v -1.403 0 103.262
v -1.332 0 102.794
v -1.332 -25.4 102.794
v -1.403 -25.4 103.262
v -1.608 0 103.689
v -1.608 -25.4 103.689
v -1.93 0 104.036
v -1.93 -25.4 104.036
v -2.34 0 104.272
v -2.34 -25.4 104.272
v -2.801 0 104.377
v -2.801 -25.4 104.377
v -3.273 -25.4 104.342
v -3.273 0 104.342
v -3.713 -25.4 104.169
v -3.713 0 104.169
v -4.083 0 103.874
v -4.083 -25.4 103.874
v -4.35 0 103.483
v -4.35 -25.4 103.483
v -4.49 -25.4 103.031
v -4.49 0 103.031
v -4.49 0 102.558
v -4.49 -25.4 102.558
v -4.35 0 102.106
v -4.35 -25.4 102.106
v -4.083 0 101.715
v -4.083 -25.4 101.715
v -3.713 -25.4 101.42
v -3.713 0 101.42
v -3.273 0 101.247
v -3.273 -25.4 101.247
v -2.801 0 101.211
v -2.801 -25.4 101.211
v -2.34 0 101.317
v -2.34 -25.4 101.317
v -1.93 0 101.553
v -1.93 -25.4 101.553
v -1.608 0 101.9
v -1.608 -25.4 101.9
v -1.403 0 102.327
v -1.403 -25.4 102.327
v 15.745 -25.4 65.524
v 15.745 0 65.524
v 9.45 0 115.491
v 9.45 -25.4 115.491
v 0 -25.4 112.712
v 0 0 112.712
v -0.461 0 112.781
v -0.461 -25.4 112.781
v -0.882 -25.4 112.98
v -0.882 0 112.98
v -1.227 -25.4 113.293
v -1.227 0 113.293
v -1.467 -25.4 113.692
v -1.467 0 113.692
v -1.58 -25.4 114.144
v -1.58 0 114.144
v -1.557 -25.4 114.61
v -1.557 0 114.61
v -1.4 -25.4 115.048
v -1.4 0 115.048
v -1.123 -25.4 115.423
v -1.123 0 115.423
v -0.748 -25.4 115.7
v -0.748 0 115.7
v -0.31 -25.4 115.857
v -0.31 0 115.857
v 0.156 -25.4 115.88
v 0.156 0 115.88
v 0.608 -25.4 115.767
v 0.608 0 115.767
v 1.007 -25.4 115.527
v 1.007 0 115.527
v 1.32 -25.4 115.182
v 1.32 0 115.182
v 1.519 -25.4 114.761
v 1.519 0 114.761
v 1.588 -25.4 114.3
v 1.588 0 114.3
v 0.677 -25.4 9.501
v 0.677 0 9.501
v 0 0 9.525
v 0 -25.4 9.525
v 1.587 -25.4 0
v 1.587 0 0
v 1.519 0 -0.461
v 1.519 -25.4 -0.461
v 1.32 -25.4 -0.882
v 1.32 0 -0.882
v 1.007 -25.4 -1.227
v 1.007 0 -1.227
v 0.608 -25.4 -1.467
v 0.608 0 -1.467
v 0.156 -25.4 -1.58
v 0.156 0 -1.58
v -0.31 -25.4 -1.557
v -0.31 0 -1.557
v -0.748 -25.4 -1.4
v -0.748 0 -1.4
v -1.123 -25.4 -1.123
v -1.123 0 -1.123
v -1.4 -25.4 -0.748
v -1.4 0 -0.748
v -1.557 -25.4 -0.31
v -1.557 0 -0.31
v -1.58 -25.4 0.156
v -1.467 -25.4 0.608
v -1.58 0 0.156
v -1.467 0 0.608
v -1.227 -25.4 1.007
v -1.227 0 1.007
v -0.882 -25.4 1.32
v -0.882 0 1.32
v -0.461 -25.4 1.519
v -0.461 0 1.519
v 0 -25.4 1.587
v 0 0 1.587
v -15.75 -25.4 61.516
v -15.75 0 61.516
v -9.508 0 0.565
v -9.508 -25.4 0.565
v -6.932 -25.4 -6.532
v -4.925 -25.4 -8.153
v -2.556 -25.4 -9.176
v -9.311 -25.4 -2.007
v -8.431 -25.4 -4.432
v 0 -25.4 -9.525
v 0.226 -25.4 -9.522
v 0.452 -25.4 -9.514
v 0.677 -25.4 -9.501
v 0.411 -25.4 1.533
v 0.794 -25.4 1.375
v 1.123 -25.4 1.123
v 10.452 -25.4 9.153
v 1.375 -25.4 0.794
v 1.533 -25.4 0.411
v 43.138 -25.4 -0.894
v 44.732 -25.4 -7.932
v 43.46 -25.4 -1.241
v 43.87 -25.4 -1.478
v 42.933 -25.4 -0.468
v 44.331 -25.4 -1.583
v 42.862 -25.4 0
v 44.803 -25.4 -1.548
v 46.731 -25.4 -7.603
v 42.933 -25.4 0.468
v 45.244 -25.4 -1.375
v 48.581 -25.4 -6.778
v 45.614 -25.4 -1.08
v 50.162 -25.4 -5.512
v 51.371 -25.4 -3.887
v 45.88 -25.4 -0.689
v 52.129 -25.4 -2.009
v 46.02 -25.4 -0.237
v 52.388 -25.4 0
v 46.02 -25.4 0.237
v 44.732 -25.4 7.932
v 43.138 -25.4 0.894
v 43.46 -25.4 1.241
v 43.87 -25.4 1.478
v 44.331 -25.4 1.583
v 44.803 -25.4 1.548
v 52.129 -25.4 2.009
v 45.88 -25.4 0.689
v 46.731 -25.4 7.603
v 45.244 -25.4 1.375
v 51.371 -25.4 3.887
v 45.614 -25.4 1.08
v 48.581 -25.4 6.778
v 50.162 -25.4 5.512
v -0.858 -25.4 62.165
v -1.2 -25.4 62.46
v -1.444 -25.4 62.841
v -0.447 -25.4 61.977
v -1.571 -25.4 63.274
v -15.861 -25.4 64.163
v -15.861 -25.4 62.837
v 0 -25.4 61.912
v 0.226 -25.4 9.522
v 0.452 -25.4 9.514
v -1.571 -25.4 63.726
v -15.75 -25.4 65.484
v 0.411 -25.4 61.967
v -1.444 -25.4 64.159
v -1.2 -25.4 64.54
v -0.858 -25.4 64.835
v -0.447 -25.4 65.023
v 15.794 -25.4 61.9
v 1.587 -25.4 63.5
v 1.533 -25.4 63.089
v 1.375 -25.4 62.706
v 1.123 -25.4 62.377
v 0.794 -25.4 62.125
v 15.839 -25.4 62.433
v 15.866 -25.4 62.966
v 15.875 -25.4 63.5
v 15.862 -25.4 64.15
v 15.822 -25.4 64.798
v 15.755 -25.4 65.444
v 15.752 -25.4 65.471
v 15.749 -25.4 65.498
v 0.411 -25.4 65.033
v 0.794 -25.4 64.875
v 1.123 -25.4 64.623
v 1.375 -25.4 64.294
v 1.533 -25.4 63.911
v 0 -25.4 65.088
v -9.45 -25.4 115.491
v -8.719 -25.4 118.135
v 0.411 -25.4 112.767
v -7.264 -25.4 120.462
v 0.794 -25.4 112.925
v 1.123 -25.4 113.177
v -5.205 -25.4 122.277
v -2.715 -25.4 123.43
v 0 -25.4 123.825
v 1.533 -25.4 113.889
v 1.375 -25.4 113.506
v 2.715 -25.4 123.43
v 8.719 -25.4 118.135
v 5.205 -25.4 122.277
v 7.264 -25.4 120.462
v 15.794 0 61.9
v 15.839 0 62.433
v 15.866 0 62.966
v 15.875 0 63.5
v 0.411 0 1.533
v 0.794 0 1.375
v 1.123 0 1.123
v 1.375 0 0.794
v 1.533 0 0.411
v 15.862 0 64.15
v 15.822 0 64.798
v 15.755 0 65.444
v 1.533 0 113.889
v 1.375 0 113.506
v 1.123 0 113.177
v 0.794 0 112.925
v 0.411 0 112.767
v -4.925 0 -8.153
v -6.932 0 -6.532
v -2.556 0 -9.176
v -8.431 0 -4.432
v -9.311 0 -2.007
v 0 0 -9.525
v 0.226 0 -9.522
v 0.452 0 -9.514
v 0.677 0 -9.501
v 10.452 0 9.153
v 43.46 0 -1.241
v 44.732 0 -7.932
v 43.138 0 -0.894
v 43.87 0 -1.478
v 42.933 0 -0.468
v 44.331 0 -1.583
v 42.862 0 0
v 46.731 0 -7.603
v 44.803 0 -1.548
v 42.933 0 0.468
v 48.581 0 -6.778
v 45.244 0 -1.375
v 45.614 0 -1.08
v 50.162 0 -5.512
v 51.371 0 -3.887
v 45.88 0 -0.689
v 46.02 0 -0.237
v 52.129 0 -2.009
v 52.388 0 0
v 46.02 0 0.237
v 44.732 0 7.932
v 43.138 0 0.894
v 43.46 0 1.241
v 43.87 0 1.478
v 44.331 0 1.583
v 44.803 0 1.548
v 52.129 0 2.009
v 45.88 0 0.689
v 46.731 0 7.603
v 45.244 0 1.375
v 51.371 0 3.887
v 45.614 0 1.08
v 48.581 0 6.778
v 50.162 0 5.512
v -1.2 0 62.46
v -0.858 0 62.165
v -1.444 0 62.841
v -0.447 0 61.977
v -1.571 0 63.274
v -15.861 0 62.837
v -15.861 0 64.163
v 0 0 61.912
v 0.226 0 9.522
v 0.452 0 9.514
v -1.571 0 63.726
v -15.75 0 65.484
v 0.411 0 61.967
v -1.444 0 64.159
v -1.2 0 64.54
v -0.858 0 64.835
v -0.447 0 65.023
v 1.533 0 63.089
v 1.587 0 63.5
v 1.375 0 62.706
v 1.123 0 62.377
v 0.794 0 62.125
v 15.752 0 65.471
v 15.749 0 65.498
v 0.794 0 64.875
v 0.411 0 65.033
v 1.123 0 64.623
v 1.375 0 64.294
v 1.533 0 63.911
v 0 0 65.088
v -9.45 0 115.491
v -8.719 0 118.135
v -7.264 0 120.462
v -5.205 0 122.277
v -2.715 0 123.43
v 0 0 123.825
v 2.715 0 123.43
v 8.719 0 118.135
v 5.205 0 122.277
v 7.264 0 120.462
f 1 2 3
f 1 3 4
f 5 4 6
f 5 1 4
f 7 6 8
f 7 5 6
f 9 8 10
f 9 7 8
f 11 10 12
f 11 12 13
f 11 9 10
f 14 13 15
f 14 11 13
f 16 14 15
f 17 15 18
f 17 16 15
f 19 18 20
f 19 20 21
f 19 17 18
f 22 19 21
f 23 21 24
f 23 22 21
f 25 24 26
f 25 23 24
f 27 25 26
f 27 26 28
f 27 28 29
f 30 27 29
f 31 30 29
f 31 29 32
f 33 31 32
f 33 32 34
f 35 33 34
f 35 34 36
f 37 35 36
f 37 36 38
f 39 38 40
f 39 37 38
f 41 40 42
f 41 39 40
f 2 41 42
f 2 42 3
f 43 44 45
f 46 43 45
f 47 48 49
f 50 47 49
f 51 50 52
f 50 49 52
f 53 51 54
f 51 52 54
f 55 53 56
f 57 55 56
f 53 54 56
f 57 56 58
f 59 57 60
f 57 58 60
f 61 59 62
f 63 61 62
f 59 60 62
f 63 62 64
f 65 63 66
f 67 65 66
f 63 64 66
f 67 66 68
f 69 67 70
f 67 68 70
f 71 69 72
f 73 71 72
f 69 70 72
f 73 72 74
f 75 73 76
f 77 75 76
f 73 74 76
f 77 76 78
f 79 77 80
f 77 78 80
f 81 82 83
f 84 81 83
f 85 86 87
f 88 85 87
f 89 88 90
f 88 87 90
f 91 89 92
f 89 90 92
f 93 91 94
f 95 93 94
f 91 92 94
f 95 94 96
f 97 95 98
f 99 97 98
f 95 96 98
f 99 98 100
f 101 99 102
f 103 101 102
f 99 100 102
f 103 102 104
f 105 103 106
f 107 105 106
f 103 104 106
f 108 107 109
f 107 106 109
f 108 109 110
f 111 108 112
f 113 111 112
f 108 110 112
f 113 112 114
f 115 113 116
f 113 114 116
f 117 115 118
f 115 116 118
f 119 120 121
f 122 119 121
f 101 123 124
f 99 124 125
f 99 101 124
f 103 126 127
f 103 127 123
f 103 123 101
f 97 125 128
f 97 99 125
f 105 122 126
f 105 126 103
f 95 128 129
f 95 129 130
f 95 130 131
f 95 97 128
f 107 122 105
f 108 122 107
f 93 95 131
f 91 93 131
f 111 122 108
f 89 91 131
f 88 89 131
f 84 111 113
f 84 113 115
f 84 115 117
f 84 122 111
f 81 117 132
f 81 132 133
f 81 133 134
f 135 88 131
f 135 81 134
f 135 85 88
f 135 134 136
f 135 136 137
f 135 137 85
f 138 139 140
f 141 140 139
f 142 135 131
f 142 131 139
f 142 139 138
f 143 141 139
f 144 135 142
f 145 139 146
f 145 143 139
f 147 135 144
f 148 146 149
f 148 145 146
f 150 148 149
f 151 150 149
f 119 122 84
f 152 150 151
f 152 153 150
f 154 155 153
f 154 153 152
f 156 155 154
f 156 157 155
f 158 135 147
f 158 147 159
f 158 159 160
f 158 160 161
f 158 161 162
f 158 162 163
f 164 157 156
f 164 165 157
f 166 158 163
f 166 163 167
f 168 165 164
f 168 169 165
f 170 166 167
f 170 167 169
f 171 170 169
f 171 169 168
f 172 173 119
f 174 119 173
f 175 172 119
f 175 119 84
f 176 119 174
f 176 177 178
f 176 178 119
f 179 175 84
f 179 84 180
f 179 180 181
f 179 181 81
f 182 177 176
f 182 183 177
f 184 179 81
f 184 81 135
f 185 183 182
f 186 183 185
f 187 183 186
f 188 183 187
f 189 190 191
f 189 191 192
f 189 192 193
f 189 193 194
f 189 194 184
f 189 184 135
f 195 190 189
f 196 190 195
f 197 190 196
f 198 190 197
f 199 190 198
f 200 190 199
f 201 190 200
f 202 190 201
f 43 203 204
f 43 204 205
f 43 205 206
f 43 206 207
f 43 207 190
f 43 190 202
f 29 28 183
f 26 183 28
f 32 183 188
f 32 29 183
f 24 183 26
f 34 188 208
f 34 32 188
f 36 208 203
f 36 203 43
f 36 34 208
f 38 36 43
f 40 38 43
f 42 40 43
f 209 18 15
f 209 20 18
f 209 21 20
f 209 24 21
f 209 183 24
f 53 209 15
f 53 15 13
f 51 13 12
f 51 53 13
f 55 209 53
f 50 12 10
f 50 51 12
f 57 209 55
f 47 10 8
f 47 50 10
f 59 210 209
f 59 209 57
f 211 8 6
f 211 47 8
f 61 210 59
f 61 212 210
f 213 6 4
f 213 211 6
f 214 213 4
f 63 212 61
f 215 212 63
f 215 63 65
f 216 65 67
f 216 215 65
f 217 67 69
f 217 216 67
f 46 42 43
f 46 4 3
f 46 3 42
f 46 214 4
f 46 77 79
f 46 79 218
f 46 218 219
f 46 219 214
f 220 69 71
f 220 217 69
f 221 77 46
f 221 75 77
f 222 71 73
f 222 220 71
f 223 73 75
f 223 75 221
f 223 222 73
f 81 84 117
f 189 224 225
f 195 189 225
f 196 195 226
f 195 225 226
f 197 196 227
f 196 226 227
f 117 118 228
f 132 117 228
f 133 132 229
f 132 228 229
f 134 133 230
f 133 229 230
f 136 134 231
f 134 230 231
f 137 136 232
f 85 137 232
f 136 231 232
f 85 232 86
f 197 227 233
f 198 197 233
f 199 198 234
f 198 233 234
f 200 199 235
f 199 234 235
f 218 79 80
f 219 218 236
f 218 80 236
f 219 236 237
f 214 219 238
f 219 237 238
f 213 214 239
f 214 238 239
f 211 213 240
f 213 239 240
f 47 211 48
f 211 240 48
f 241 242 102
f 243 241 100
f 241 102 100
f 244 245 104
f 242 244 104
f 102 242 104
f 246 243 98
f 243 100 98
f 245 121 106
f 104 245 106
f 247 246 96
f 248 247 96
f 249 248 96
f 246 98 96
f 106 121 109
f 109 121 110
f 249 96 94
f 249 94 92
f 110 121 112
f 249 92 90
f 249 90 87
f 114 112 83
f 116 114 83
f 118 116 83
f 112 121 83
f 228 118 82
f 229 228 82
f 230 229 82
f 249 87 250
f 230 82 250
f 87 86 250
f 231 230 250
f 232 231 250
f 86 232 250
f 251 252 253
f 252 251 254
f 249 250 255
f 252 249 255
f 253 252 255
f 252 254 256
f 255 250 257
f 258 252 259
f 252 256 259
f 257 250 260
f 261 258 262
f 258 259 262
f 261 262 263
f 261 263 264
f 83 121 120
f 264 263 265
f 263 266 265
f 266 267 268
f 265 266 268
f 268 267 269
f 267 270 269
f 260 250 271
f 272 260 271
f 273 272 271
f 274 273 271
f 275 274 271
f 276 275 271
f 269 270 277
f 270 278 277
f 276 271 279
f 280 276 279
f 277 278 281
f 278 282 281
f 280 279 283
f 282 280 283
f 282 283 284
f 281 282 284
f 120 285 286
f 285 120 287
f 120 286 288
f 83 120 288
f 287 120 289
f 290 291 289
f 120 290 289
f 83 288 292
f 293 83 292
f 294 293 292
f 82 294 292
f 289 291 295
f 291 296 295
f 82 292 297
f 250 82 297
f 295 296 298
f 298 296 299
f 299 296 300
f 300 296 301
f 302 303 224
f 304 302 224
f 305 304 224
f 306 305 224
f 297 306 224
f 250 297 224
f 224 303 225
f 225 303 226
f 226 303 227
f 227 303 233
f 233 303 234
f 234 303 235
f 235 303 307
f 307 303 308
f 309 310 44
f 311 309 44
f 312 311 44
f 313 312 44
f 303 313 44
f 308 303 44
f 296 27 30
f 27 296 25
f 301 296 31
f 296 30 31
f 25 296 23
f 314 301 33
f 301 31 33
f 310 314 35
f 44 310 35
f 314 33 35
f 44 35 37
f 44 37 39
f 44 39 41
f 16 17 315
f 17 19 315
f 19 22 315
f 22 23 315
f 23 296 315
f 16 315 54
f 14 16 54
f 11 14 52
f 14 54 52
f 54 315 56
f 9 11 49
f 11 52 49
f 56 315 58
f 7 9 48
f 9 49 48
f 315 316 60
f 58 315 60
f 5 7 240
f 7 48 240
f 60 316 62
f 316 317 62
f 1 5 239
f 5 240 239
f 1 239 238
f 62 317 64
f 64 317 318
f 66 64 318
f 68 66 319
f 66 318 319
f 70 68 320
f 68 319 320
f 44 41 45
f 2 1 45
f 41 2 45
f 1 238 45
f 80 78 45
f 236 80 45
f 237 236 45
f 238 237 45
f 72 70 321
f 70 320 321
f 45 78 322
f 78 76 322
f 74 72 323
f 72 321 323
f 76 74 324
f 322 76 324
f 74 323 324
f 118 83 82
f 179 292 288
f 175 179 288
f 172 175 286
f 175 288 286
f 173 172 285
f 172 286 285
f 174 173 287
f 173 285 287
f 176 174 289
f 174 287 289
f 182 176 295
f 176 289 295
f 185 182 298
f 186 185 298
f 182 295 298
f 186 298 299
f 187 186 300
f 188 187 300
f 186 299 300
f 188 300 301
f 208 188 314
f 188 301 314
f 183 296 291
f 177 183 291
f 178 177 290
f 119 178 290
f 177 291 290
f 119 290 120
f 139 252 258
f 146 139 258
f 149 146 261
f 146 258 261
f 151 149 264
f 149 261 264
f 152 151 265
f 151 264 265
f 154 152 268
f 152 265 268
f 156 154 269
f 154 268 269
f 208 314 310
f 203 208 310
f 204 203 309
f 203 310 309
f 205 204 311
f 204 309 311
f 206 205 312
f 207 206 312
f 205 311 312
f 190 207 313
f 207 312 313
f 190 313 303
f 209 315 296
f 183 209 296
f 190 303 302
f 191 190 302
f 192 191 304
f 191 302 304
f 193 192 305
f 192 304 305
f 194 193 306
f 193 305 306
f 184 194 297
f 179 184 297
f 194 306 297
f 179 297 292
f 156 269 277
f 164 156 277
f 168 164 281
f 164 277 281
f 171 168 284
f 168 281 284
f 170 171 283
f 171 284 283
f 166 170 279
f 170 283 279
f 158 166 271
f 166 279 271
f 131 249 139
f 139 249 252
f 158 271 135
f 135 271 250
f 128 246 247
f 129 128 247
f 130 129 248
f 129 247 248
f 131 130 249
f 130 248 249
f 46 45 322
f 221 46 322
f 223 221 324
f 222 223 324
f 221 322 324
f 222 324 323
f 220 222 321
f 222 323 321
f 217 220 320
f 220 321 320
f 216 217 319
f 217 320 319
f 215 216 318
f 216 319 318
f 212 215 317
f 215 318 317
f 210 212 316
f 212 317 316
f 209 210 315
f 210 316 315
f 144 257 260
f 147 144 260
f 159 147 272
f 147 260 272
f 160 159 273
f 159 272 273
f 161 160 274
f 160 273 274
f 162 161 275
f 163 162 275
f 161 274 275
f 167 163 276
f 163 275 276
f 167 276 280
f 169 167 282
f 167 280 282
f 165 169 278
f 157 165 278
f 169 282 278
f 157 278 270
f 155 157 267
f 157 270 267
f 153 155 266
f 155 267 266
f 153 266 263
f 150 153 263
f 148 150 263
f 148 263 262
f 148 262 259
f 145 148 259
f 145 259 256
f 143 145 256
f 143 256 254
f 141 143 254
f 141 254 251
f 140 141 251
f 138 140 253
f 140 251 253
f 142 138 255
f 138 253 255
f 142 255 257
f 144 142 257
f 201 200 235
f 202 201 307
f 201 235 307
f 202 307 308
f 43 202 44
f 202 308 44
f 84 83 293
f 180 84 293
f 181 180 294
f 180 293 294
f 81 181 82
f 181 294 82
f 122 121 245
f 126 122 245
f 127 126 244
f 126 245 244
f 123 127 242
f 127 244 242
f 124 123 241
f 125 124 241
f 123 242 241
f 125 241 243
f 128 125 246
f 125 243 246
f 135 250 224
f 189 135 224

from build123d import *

# Parameters (mm, degrees)
F0_R     = 1.5875
F1_DEPTH = 25.4


# Not quite as in the source:
# - ends of sketch curves that miss each other by under 0.0002 mm in the source are joined


with BuildPart() as f1:
    # F0 (on Front) → F1 (new body)
    with BuildSketch(Plane.XZ):
        with BuildLine():
            ThreePointArc((1.5875, 0), (-1.1225320151, -1.1225320151), (0, 1.5875))
            Line((0, 1.5875), (0, 9.525))
            ThreePointArc((0, 9.525), (-6.5322234356, 6.9322205668), (-9.5082023407, 0.5654319132))
            ThreePointArc((-9.5082023407, 0.5654319132), (-6.9322205668, -6.5322234356), (0, -9.525))
            Line((0, -9.525), (0.6773435479, -9.500885786))
            ThreePointArc((0.6773435479, -9.500885786), (6.9705567315, -6.4912990883), (9.525, 0))
            Line((9.525, 0), (1.5875, 0))
        make_face()
        with BuildLine():
            ThreePointArc((-9.5082023407, 0.5654319132), (-6.5322234356, 6.9322205668), (0, 9.525))
            Line((0, 9.525), (0, 47.625))
            ThreePointArc((0, 47.625), (-10.5003255158, 51.59375), (-15.7504882737, 61.515625))
            Line((-15.7504882737, 61.515625), (-9.5082023407, 0.5654319132))
        make_face()
        with BuildLine():
            Line((0, 47.625), (0, 9.525))
            ThreePointArc((0, 9.525), (0.3388863295, 9.5189695375), (0.6773435479, 9.500885786))
            Line((0.6773435479, 9.500885786), (10.4519953809, 9.152896871))
            Line((10.4519953809, 9.152896871), (15.7942028036, 61.9003804205))
            ThreePointArc((15.7942028036, 61.9003804205), (10.644756084, 51.722700101), (0, 47.625))
        make_face()
        with BuildLine():
            Line((10.4519953809, 9.152896871), (9.525, 0))
            Line((9.525, 0), (36.5125, 0))
            ThreePointArc((36.5125, 0), (38.9380895153, 5.7116327839), (44.7324052746, 7.9324746146))
            Line((44.7324052746, 7.9324746146), (10.4519953809, 9.152896871))
        make_face()
        with BuildLine():
            Line((36.5125, 0), (9.525, 0))
            ThreePointArc((9.525, 0), (6.9705567315, -6.4912990883), (0.6773435479, -9.500885786))
            Line((0.6773435479, -9.500885786), (44.7324052746, -7.9324746146))
            ThreePointArc((44.7324052746, -7.9324746146), (38.9380895153, -5.7116327839), (36.5125, 0))
        make_face()
        with BuildLine():
            ThreePointArc((0.6773435479, 9.500885786), (6.9705567315, 6.4912990883), (9.525, 0))
            Line((9.525, 0), (10.4519953809, 9.152896871))
            Line((10.4519953809, 9.152896871), (0.6773435479, 9.500885786))
        make_face()
        with BuildLine():
            ThreePointArc((-15.7504882737, 61.515625), (-10.5003255158, 51.59375), (0, 47.625))
            Line((0, 47.625), (0, 61.9125))
            ThreePointArc((0, 61.9125), (-1.5875, 63.5), (0, 65.0875))
            Line((0, 65.0875), (0, 79.375))
            ThreePointArc((0, 79.375), (-10.5003255158, 75.40625), (-15.7504882737, 65.484375))
            ThreePointArc((-15.7504882737, 65.484375), (-15.875, 63.5), (-15.7504882737, 61.515625))
        make_face()
        with BuildLine():
            ThreePointArc((0, 79.375), (10.5154665352, 75.3928797415), (15.7554871092, 65.444286746))
            Line((15.7554871092, 65.444286746), (9.4502929642, 115.490625))
            ThreePointArc((9.4502929642, 115.490625), (9.5063048942, 114.896483242), (9.525, 114.3))
            ThreePointArc((9.525, 114.3), (6.7351920908, 107.5648079092), (0, 104.775))
            Line((0, 104.775), (0, 79.375))
        make_face()
        with BuildLine():
            Line((0, 61.9125), (0, 47.625))
            ThreePointArc((0, 47.625), (10.644756084, 51.722700101), (15.7942028036, 61.9003804205))
            ThreePointArc((15.7942028036, 61.9003804205), (15.8547878338, 62.6991705884), (15.875, 63.5))
            ThreePointArc((15.875, 63.5), (15.8450936075, 64.4739782187), (15.7554871092, 65.444286746))
            ThreePointArc((15.7554871092, 65.444286746), (10.5154665352, 75.3928797415), (0, 79.375))
            Line((0, 79.375), (0, 65.0875))
            ThreePointArc((0, 65.0875), (1.1225320151, 64.6225320151), (1.5875, 63.5))
            ThreePointArc((1.5875, 63.5), (1.1225320151, 62.3774679849), (0, 61.9125))
        make_face()
        with BuildLine():
            ThreePointArc((44.7324052746, 7.9324746146), (38.9380895153, 5.7116327839), (36.5125, 0))
            ThreePointArc((36.5125, 0), (38.9380895153, -5.7116327839), (44.7324052746, -7.9324746146))
            ThreePointArc((44.7324052746, -7.9324746146), (50.1616327839, -5.5119104847), (52.3875, 0))
            ThreePointArc((52.3875, 0), (50.1616327839, 5.5119104847), (44.7324052746, 7.9324746146))
        make_face()
        with BuildLine():
            ThreePointArc((46.0375, 0), (44.45, -1.5875), (42.8625, 0))
            ThreePointArc((42.8625, 0), (44.45, 1.5875), (46.0375, 0))
        make_face(mode=Mode.SUBTRACT)
        with BuildLine():
            ThreePointArc((0, -9.525), (0.3388863295, -9.5189695375), (0.6773435479, -9.500885786))
            Line((0.6773435479, -9.500885786), (0, -9.525))
        make_face()
        with BuildLine():
            Line((-9.4502929642, 115.490625), (-15.7504882737, 65.484375))
            ThreePointArc((-15.7504882737, 65.484375), (-10.5003255158, 75.40625), (0, 79.375))
            Line((0, 79.375), (0, 104.775))
            ThreePointArc((0, 104.775), (-7.14375, 107.9998046905), (-9.4502929642, 115.490625))
        make_face()
        with Locations((-2.919731196, 102.79443115)):
            Circle(F0_R, mode=Mode.SUBTRACT)
        with BuildLine():
            ThreePointArc((9.4502929642, 115.490625), (0, 123.825), (-9.4502929642, 115.490625))
            ThreePointArc((-9.4502929642, 115.490625), (-7.14375, 107.9998046905), (0, 104.775))
            ThreePointArc((0, 104.775), (6.7351920908, 107.5648079092), (9.525, 114.3))
            ThreePointArc((9.525, 114.3), (9.5063048942, 114.896483242), (9.4502929642, 115.490625))
        make_face()
        with BuildLine():
            ThreePointArc((1.5875, 114.3), (1.1225320151, 113.1774679849), (0, 112.7125))
            ThreePointArc((0, 112.7125), (-1.1225320151, 115.4225320151), (1.5875, 114.3))
        make_face(mode=Mode.SUBTRACT)
        with BuildLine():
            Line((0, 9.525), (0, 1.5875))
            ThreePointArc((0, 1.5875), (1.1225320151, 1.1225320151), (1.5875, 0))
            Line((1.5875, 0), (9.525, 0))
            ThreePointArc((9.525, 0), (6.9705567315, 6.4912990883), (0.6773435479, 9.500885786))
            Line((0.6773435479, 9.500885786), (0, 9.525))
        make_face()
    extrude(amount=F1_DEPTH)


solid = f1.part
